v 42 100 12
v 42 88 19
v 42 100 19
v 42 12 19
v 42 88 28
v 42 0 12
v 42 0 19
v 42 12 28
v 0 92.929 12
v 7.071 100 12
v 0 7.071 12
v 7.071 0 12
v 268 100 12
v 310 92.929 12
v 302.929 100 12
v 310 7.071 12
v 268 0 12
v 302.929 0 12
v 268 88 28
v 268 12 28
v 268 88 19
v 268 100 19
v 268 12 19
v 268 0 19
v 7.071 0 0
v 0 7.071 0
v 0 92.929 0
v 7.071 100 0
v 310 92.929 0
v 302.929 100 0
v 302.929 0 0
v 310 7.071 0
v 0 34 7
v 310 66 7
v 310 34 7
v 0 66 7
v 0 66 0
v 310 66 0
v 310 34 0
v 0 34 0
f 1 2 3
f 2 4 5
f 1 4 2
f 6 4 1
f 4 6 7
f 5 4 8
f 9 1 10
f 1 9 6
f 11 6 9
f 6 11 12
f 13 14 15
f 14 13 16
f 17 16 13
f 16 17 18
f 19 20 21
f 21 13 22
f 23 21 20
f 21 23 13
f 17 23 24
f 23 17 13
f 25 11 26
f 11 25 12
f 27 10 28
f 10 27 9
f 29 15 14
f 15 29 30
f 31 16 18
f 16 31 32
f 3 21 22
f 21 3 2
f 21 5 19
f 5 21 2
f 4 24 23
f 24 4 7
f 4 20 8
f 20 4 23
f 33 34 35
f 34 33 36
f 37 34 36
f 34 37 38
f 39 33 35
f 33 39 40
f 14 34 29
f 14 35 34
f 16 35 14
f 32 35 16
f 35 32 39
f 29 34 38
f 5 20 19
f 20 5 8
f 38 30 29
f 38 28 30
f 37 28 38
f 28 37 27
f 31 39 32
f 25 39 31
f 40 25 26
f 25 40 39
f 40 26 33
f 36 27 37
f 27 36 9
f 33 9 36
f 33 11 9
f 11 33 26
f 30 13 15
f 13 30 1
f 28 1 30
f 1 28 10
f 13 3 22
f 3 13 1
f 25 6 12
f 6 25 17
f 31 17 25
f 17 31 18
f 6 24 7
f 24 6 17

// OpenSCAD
include <../src/wardrobe.scad>;
plank_zx_rear_middle();
//github_openscad -o wardrobe_1/plank_zx_rear_middle.stl -D wardrobe_n=1 -D cutting_edge=0 -D break_view_length=0 wardrobe_1/plank_zx_rear_middle_stl.scad
